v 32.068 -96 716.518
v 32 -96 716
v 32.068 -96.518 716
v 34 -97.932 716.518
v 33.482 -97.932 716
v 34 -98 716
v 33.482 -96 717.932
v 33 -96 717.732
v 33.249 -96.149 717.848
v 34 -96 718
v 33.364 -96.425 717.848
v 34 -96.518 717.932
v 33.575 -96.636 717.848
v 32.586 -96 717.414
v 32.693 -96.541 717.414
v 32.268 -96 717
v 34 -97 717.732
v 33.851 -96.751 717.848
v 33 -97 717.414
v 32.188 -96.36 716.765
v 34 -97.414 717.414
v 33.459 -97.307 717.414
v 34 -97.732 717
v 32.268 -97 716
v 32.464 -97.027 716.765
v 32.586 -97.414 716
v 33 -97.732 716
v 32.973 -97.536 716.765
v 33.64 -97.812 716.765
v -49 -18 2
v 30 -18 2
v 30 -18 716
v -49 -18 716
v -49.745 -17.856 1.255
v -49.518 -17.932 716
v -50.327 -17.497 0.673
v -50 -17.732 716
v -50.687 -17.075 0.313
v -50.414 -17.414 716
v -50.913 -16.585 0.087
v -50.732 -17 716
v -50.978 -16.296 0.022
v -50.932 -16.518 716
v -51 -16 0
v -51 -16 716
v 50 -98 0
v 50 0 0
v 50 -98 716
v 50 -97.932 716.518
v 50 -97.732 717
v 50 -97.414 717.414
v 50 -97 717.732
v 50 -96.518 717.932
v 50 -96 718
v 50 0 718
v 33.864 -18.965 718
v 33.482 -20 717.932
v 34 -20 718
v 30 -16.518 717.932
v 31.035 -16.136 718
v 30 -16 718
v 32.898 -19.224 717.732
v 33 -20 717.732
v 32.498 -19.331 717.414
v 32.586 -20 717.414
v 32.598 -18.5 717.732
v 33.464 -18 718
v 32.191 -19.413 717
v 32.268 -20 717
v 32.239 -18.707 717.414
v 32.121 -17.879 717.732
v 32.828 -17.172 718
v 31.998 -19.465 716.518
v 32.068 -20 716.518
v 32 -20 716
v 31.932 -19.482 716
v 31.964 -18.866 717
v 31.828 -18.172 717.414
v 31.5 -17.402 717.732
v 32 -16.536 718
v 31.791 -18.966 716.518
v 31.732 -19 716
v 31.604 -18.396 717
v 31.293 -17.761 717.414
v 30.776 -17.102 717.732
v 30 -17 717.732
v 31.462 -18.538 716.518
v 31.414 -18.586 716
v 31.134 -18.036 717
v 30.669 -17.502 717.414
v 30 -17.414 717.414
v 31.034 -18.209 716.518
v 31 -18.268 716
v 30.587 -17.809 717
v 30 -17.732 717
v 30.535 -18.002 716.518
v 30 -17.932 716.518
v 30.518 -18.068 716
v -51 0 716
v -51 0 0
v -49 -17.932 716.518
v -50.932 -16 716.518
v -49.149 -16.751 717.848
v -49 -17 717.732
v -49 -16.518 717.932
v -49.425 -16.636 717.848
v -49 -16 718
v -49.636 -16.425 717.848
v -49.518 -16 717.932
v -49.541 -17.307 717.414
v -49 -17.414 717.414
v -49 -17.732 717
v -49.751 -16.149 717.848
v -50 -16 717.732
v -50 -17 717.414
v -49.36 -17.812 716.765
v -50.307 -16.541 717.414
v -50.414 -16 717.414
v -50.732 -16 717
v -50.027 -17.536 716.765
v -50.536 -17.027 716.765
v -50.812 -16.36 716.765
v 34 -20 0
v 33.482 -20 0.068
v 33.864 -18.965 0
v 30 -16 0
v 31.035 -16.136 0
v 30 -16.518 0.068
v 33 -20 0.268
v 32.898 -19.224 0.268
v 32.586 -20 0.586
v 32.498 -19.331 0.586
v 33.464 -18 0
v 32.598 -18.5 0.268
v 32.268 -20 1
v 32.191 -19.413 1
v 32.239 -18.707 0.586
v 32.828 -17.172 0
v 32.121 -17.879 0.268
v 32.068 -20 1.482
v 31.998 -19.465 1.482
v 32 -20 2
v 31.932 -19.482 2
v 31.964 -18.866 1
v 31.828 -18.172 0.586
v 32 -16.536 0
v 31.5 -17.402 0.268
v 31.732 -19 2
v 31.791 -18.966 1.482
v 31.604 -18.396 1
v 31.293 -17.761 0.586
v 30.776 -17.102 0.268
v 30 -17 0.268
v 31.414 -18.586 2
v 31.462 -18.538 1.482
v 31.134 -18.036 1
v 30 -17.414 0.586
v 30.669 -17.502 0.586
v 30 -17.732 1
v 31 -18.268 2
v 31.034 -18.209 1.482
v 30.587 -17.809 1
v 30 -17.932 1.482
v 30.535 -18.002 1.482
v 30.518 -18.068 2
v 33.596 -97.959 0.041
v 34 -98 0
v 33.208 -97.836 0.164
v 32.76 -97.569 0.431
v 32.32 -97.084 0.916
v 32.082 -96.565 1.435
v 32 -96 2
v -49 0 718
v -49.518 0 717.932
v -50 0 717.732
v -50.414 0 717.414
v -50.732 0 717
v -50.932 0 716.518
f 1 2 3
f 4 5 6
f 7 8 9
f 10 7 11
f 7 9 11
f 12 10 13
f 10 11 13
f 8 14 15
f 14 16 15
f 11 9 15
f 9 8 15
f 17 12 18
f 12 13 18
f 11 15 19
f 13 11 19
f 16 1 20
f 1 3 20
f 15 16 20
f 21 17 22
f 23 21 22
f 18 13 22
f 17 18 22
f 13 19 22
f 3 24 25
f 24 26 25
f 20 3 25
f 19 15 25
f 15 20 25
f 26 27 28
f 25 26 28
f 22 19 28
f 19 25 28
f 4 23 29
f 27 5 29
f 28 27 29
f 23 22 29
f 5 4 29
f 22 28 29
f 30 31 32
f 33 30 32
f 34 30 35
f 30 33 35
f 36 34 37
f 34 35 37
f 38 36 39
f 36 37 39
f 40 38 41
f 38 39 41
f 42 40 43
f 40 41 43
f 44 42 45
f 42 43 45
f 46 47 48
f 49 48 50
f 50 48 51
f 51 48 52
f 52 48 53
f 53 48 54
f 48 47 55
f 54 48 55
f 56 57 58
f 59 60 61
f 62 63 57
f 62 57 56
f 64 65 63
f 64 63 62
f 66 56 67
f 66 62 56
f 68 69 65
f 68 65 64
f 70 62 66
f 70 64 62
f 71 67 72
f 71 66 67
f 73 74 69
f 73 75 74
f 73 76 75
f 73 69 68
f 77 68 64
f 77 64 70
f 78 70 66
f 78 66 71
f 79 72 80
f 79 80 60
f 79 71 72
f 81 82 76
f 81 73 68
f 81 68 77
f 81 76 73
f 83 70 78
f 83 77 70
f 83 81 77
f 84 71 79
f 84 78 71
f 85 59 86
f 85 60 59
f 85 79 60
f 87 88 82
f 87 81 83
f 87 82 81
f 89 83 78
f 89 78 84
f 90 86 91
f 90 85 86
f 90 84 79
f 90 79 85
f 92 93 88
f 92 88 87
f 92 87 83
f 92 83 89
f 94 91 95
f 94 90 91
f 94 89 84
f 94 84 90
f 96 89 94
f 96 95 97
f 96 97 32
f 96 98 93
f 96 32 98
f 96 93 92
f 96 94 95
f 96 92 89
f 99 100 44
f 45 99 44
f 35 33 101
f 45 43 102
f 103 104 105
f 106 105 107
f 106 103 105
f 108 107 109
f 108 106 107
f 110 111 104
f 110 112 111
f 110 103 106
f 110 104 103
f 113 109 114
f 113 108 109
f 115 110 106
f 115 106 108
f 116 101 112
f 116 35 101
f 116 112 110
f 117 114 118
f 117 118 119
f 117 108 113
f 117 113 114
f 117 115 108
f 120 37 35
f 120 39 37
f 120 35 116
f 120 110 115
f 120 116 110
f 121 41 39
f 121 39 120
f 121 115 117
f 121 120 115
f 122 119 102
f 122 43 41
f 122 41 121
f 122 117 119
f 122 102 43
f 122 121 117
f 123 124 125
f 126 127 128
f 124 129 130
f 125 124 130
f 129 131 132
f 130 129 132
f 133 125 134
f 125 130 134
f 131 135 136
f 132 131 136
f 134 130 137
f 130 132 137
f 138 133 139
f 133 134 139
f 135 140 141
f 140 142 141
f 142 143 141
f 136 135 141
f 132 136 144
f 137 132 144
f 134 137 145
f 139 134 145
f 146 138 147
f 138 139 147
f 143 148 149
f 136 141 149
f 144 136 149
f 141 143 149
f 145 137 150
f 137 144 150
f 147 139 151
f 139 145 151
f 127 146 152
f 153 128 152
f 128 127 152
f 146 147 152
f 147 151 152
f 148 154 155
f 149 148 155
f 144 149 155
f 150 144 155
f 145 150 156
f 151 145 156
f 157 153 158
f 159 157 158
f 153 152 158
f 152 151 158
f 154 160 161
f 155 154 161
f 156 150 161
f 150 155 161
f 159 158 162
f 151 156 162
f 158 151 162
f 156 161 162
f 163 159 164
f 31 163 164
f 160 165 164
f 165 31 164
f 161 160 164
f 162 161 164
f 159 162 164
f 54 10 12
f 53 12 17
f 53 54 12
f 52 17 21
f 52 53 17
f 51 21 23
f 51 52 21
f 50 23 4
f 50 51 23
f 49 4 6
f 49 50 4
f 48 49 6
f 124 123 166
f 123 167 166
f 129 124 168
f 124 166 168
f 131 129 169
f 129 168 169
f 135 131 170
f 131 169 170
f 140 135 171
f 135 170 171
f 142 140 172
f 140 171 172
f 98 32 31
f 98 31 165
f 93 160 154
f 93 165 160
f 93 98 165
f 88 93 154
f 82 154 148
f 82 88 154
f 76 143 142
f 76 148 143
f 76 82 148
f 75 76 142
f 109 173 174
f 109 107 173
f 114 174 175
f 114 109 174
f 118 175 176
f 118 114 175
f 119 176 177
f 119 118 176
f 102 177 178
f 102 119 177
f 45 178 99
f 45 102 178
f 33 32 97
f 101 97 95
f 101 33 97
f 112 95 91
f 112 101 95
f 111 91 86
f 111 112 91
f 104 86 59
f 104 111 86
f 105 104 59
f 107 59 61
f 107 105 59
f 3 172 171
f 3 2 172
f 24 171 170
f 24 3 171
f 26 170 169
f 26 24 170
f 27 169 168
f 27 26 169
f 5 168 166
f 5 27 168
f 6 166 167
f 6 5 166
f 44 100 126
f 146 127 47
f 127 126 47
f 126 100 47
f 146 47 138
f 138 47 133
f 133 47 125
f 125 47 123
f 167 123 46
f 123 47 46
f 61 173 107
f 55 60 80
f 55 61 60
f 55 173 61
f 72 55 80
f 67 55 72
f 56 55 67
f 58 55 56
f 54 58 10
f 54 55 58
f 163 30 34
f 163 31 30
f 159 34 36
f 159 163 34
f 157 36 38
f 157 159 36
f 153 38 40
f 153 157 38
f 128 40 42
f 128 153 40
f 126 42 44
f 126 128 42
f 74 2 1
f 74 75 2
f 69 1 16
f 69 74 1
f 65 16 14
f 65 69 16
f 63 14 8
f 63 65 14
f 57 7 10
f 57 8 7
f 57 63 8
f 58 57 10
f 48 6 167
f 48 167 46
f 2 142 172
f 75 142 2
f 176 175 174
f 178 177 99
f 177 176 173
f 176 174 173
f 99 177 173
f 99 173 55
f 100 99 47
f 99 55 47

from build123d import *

# Parameters (mm, degrees)
F0_W      = 38.9711558819
F0_H      = 53.4048825502
F1_DEPTH  = 18
F2_DEPTH  = 50
F3_DEPTH  = 25
F4_DEPTH  = 718
F5_W      = 25
F5_H      = 718
F6_DEPTH  = 20
F7_DEPTH  = 7
F8_DEPTH  = 80
F9_DEPTH  = 20
F10_DEPTH = 70
F11_DEPTH = 18
F12_DEPTH = 1
F13_R     = 2


with BuildPart() as f1:
    # F0 (on Front) → F1 (new body)
    with BuildSketch(Plane.XZ):
        with Locations((19.4855779409, 26.7024412751)):
            Rectangle(F0_W, F0_H)
    extrude(amount=F1_DEPTH)

    # F2 (add): a face of the model
    f2_faces = [f1.faces().sort_by_distance(p)[0] for p in [
        (0, -9, 26.7024412751),
    ]]
    extrude(f2_faces, amount=-F2_DEPTH)

    # F3 (add): a face of the model
    f3_faces = [f1.faces().sort_by_distance(p)[0] for p in [
        (25, -9, 0),
    ]]
    extrude(f3_faces, amount=-F3_DEPTH)

    # F4 (add): a face of the model
    f4_faces = [f1.faces().sort_by_distance(p)[0] for p in [
        (25, -9, 0),
    ]]
    extrude(f4_faces, amount=-F4_DEPTH)

    # F5 (on face) → F6 (join)
    with BuildSketch(Plane.XZ.offset(18)):
        with Locations((37.5, 359)):
            Rectangle(F5_W, F5_H)
    extrude(amount=F6_DEPTH)

    # F7 (cut): a face of the model
    f7_faces = [f1.faces().sort_by_distance(p)[0] for p in [
        (25, -28, 359),
    ]]
    extrude(f7_faces, amount=-F7_DEPTH, mode=Mode.SUBTRACT)

    # F8 (add): a face of the model
    f8_faces = [f1.faces().sort_by_distance(p)[0] for p in [
        (41, -38, 359),
    ]]
    extrude(f8_faces, amount=F8_DEPTH)

    # F9 (cut): a face of the model
    f9_faces = [f1.faces().sort_by_distance(p)[0] for p in [
        (41, -118, 359),
    ]]
    extrude(f9_faces, amount=-F9_DEPTH, mode=Mode.SUBTRACT)

    # F10 (add): a face of the model
    f10_faces = [f1.faces().sort_by_distance(p)[0] for p in [
        (0, -9, 359),
    ]]
    extrude(f10_faces, amount=F10_DEPTH)

    # F11 (cut): a face of the model
    f11_faces = [f1.faces().sort_by_distance(p)[0] for p in [
        (-70, -9, 359),
    ]]
    extrude(f11_faces, amount=-F11_DEPTH, mode=Mode.SUBTRACT)

    # F12 (cut): a face of the model
    f12_faces = [f1.faces().sort_by_distance(p)[0] for p in [
        (-52, -9, 359),
    ]]
    extrude(f12_faces, amount=-F12_DEPTH, mode=Mode.SUBTRACT)

    # F13
    f13_edges = [f1.edges().sort_by_distance(p)[0] for p in [
        (-9.5, -18, 0),
        (-51, -18, 359),
        (-9.5, -18, 718),
        (32, -18, 359),
        (32, -58, 0),
        (32, -98, 359),
        (32, -58, 718),
        (41, -98, 718),
        (-51, -9, 718),
    ]]
    fillet(f13_edges, radius=F13_R)


solid = f1.part
